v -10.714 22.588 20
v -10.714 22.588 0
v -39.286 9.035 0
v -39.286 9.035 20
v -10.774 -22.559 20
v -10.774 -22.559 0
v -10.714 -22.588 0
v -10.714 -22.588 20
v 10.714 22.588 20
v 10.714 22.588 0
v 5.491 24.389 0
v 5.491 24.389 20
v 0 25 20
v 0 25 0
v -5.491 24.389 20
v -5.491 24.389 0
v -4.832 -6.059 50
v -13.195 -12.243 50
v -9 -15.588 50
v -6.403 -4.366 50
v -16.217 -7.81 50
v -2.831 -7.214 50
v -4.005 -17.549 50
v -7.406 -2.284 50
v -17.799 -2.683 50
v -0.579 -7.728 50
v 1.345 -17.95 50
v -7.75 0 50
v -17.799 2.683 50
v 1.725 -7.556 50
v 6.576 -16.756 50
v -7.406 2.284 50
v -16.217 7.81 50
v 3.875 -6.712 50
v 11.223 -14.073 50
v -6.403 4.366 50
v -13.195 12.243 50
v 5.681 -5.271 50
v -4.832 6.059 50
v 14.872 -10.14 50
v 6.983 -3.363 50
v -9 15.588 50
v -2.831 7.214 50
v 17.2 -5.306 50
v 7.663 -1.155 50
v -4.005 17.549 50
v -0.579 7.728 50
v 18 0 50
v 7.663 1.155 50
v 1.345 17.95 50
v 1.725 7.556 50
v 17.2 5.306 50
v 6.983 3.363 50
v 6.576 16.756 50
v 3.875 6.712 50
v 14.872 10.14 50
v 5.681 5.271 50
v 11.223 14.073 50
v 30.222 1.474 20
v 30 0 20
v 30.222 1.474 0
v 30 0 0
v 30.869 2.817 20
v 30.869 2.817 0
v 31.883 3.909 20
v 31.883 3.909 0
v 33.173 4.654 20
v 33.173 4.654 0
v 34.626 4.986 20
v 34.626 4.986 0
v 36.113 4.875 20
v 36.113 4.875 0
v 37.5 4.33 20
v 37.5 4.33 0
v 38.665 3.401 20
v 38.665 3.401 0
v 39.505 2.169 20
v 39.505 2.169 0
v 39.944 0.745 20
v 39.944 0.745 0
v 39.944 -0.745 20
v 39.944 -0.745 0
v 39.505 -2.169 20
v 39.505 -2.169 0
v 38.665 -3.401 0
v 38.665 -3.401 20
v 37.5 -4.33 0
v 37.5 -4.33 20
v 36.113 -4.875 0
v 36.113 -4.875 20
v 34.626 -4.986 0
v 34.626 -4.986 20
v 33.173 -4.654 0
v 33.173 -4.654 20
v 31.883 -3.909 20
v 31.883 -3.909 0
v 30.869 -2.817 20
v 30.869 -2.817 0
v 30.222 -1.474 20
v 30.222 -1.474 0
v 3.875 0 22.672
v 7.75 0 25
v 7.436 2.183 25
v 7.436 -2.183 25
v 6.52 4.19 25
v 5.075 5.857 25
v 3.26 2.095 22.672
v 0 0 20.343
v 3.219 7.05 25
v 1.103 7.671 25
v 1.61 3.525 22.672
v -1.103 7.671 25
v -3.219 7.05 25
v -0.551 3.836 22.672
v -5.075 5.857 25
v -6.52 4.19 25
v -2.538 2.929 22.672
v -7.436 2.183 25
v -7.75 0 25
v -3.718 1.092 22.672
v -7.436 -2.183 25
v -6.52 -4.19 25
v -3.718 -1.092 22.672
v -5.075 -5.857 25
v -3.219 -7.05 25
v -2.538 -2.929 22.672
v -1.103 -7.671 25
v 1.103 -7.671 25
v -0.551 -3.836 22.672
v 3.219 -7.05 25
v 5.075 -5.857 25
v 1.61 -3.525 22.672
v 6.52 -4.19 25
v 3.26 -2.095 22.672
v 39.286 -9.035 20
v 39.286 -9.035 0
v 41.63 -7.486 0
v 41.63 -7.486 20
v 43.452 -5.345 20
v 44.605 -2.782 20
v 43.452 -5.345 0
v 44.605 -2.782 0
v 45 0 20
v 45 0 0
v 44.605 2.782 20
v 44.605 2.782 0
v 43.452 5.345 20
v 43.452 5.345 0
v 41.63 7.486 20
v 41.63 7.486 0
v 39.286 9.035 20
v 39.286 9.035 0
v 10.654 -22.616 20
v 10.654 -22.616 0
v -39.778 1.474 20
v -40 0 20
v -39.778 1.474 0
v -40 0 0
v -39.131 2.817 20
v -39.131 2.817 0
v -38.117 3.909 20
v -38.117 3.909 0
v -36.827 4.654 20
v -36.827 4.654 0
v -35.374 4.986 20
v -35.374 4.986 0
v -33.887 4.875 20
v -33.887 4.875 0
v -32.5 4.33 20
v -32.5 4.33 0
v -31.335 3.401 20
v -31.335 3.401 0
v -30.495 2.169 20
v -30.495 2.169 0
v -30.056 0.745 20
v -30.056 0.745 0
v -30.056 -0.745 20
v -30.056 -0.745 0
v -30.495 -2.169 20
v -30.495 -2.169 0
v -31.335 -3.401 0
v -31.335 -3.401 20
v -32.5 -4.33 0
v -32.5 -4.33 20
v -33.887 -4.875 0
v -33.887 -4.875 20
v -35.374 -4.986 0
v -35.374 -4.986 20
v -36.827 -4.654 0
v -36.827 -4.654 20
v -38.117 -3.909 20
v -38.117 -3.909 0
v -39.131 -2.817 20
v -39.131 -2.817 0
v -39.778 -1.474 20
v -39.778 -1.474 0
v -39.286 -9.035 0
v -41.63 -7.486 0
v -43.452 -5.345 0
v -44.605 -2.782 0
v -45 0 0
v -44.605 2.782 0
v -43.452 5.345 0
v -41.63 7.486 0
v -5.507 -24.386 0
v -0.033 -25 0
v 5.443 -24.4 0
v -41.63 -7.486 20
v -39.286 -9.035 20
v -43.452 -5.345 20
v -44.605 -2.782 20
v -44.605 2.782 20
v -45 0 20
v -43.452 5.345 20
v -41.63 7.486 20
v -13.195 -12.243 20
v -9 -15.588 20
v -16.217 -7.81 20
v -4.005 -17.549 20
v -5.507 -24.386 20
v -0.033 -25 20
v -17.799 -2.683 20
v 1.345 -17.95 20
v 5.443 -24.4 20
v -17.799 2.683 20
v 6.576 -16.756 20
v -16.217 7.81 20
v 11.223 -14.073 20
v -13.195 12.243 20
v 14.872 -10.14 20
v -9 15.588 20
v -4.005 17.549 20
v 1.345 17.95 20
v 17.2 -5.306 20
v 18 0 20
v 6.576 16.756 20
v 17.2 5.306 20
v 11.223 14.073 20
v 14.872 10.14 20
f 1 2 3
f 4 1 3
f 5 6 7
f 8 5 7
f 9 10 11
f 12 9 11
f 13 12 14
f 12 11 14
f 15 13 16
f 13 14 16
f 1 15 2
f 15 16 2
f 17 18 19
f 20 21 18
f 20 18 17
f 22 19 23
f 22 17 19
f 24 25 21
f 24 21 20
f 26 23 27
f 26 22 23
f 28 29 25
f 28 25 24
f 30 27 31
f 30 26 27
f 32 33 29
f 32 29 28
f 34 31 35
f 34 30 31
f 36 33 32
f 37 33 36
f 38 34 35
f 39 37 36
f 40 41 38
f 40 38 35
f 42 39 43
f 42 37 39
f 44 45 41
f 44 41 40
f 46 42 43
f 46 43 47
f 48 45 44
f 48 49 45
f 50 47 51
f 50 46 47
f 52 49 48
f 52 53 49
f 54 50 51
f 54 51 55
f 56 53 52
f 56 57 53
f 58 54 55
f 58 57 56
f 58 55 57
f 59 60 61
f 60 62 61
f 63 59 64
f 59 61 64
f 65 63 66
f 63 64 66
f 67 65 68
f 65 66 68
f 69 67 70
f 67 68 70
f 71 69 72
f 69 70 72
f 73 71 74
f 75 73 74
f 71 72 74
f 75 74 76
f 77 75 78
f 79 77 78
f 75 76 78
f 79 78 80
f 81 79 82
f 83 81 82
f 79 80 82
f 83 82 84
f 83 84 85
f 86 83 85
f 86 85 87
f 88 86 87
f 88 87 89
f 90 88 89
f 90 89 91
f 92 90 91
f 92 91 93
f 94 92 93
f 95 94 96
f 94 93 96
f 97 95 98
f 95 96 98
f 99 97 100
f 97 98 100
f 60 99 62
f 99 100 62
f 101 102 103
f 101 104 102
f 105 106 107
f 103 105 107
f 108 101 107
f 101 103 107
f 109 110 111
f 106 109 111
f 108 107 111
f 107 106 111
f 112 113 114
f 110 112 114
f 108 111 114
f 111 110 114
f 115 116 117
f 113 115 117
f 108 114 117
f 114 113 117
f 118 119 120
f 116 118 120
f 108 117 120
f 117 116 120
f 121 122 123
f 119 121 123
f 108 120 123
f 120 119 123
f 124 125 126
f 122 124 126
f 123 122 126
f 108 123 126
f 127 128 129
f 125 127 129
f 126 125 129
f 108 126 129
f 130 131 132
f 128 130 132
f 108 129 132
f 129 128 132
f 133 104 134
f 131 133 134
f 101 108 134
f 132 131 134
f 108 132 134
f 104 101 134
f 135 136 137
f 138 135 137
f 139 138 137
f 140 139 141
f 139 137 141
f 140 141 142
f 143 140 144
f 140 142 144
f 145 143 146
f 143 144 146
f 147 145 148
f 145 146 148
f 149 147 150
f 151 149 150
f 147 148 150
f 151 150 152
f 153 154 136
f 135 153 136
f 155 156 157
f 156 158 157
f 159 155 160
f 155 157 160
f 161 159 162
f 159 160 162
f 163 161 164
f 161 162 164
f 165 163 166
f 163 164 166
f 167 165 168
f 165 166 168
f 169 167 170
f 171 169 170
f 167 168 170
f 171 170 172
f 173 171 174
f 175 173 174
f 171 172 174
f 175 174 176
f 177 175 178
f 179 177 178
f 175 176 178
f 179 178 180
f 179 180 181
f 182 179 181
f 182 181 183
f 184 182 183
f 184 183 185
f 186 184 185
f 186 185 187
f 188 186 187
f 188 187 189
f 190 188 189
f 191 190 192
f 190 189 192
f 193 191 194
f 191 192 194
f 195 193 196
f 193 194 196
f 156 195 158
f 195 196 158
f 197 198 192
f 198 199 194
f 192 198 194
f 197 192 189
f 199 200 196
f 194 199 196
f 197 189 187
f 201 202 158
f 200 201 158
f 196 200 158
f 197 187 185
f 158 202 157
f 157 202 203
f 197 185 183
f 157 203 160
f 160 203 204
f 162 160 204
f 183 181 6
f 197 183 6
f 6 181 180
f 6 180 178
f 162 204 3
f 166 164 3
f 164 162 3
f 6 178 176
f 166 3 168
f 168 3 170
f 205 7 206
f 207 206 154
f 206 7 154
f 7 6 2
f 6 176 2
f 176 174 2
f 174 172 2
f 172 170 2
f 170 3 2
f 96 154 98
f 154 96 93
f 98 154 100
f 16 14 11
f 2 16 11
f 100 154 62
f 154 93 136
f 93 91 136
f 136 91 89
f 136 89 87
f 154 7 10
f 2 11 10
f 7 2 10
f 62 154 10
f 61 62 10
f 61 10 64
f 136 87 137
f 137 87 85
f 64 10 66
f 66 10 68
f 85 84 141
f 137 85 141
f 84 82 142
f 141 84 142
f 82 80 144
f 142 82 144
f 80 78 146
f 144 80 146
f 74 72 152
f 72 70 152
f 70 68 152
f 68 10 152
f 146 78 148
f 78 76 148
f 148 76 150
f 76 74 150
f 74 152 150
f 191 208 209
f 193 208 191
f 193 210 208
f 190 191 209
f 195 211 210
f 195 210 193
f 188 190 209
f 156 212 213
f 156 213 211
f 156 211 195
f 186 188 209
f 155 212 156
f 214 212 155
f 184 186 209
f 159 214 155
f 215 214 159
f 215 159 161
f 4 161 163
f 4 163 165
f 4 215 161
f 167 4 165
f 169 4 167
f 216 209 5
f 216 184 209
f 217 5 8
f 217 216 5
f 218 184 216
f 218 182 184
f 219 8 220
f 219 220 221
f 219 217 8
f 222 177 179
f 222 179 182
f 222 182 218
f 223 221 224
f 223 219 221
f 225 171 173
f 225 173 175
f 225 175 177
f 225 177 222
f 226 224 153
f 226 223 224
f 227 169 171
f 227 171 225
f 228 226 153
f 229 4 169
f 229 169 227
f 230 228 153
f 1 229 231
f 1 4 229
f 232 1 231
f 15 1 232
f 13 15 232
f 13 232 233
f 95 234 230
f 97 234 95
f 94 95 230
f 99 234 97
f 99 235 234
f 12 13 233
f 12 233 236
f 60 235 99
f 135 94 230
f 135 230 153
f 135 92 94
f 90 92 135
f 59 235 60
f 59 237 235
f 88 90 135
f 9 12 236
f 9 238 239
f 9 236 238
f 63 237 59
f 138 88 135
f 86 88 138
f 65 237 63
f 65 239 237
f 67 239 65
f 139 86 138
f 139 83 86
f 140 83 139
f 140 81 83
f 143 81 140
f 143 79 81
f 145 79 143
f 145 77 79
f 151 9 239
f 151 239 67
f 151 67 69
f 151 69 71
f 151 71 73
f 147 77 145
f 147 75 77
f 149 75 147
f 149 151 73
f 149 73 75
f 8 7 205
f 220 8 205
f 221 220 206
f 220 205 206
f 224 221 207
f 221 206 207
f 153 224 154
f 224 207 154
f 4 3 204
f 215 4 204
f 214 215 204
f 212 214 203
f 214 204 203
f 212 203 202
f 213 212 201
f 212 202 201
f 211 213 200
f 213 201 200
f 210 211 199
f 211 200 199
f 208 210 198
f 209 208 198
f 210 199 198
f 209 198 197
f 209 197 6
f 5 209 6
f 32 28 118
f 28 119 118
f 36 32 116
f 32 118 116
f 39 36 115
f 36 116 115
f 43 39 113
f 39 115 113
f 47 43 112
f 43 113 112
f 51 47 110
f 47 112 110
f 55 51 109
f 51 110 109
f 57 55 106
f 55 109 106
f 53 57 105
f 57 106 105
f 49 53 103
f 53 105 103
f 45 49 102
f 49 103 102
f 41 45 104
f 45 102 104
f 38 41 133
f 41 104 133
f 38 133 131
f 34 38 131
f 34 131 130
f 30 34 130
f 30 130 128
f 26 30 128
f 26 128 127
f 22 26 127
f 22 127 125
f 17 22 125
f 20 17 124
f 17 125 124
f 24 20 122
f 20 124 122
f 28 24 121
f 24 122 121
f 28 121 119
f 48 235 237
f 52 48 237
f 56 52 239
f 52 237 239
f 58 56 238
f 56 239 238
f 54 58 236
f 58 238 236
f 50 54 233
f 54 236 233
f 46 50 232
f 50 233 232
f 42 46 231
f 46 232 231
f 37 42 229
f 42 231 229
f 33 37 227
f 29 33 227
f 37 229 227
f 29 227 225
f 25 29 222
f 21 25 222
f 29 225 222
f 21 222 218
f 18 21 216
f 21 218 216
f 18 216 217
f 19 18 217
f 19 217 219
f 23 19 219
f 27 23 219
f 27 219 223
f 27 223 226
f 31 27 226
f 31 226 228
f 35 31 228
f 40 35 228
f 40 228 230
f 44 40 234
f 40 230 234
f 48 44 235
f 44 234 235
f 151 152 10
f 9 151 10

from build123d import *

# Parameters (mm, degrees)
F1_DEPTH = 20
F3_D     = 10
F3_DEPTH = 20
F3_TIP   = 3.0043030951
F4_R     = 18
F5_DEPTH = 30
F7_D     = 15.5
F7_DEPTH = 25
F7_TIP   = 4.6566697975


# Not quite as in the source:
# - ends of sketch curves that miss each other by under 0.0002 mm in the source are joined


with BuildPart() as f1:
    # F0 (on Top) → F1 (new body)
    with BuildSketch(Plane.XY):
        with BuildLine():
            Line((-10.7142857143, 22.5876975726), (-39.2857142857, 9.0350790291))
            ThreePointArc((-39.2857142857, 9.0350790291), (-45, 0), (-39.2857142857, -9.0350790291))
            Line((-39.2857142857, -9.0350790291), (-10.7742508272, -22.5592536221))
            Line((-10.7742508272, -22.5592536221), (-10.7142857143, -22.5876975726))
            ThreePointArc((-10.7142857143, -22.5876975726), (-0.0331846382, -25.000066073), (10.6543206014, -22.6161415232))
            Line((10.6543206014, -22.6161415232), (39.2857142857, -9.0350790291))
            ThreePointArc((39.2857142857, -9.0350790291), (45, 0), (39.2857142857, 9.0350790291))
            Line((39.2857142857, 9.0350790291), (10.7142857143, 22.5876975726))
            ThreePointArc((10.7142857143, 22.5876975726), (0, 25), (-10.7142857143, 22.5876975726))
        make_face()
    extrude(amount=F1_DEPTH)

    # F3
    with Locations(Plane.XY.offset(20)):
        with Locations((-35, 0), (35, 0)):
            Hole(F3_D / 2, depth=F3_DEPTH)
            with Locations((0, 0, -(F3_DEPTH + F3_TIP / 2))):  # 118° drill point
                Cone(0, F3_D / 2, F3_TIP, mode=Mode.SUBTRACT)

    # F4 (on face) → F5 (join)
    with BuildSketch(Plane.XY.offset(20)):
        Circle(F4_R)
    extrude(amount=F5_DEPTH)

    # F7
    with Locations(Plane.XY.offset(50)):
        with Locations((0, 0)):
            Hole(F7_D / 2, depth=F7_DEPTH)
            with Locations((0, 0, -(F7_DEPTH + F7_TIP / 2))):  # 118° drill point
                Cone(0, F7_D / 2, F7_TIP, mode=Mode.SUBTRACT)


solid = f1.part
